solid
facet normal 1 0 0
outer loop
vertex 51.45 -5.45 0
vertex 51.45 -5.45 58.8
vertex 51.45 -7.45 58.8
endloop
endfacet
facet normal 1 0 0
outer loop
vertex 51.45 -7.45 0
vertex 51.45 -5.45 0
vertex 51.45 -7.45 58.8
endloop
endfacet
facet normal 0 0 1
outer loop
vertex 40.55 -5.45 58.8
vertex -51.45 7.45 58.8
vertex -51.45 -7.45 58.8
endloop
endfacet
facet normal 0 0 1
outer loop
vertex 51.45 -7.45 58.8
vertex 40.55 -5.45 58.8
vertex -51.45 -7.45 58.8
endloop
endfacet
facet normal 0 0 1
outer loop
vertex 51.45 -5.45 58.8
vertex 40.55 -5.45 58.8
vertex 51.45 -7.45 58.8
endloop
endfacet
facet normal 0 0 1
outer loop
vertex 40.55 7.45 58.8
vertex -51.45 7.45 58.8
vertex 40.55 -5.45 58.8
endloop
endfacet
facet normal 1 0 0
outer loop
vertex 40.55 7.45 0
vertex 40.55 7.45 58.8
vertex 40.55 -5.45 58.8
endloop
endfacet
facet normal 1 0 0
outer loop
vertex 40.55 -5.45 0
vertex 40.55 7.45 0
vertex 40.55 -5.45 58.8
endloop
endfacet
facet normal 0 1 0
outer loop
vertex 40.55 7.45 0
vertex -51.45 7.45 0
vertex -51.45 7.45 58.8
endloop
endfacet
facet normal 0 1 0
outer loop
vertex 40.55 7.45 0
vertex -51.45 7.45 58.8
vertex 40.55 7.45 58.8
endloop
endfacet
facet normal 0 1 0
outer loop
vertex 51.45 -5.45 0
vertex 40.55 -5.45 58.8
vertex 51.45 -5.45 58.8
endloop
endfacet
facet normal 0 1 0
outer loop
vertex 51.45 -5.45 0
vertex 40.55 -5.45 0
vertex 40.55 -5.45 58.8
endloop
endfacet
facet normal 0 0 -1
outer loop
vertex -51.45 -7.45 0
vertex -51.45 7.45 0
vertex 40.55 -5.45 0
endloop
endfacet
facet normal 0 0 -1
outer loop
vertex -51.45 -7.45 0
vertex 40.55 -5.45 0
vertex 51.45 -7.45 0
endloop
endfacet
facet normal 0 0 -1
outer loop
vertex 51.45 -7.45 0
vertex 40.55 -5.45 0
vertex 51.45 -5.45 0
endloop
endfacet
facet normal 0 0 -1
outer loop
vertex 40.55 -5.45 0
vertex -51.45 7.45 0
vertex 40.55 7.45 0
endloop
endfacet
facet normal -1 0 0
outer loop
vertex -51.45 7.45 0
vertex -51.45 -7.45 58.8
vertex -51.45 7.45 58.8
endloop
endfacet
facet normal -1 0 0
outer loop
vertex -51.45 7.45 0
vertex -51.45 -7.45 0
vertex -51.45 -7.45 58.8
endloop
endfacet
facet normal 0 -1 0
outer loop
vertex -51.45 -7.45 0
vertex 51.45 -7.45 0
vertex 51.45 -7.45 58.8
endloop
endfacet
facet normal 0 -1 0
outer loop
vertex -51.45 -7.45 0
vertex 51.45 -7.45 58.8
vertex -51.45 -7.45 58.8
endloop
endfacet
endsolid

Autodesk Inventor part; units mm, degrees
ref_plane "YZ Plane" through (0, 0, 0) normal (1, 0, 0) x (0, 1, 0)
ref_plane "XZ Plane" through (0, 0, 0) normal (0, 1, 0) x (-1, 0, 0)
ref_plane "XY Plane" through (0, 0, 0) normal (0, 0, 1) x (1, 0, 0)
sketch "Sketch1" plane through (0, 0, 0) normal (0, 0, 1) x (1, 0, 0)
  line L0 (-51.45, 7.45) -> (40.55, 7.45)
  line L1 (51.45, -5.45) -> (51.45, -7.45)
  line L2 (51.45, -7.45) -> (-51.45, -7.45)
  line L3 (-51.45, -7.45) -> (-51.45, 7.45)
  line L4 (-51.45, 7.45) -> (51.45, -7.45) construction
  line L5 (51.45, 7.45) -> (-51.45, -7.45) construction
  line L6 (40.55, 7.45) -> (40.55, -5.45)
  line L7 (40.55, -5.45) -> (51.45, -5.45)
  point P0 (0, 0)
  dimension "d0" = 102.9
  dimension "d1" = 14.9
  dimension "d2" = 12.9
  dimension "d3" = 10.9
extrude "Extrusion1" add sketch "Sketch1" along normal blind 58.8
sketch "Sketch2" plane through (40.55, -5.45, 0) normal (1, 0, 0) x (0, 0, -1)
  line L0 (0, 0) -> (-58.8, 0) projected
  line L1 (-58.8, 0) -> (-2, 0)
  line L2 (-2, 0) -> (-2, 2.25)
  line L3 (-2, 2.25) -> (-56.8, 2.25)
  line L4 (-58.8, 2.25) -> (-58.8, 0)
  line L5 (0, 12.9) -> (0, 0) projected
  line L6 (-56.8, 2.25) -> (-56.8, 0)
  line L7 (-56.8, 4.8) -> (-2, 4.8)
  line L8 (-2, 4.8) -> (-2, 2.55)
  line L9 (-2, 2.55) -> (-56.8, 2.55)
  line L10 (-58.8, 4.8) -> (-2, 2.55) construction
  line L11 (-2, 4.8) -> (-58.8, 2.55) construction
  line L12 (-56.8, 4.8) -> (-56.8, 2.6292)
  line L13 (-56.8, 5.1) -> (-2, 5.1)
  line L14 (-2, 5.1) -> (-2, 7.35)
  line L15 (-2, 7.35) -> (-56.8, 7.35)
  line L16 (-56.8, 7.35) -> (-56.8, 5.1)
  line L17 (-56.8, 5.1) -> (-2, 7.35) construction
  line L18 (-2, 5.1) -> (-56.8, 7.35) construction
  line L19 (-58.8, 0) -> (-58.8, 12.9) projected
  line L20 (-56.8, 10.9) -> (-2, 10.9)
  line L21 (-2, 10.9) -> (-2, 8.7469)
  line L22 (-2, 8.7469) -> (-56.8, 8.7469)
  line L23 (-56.8, 8.7469) -> (-56.8, 10.9)
  line L24 (-56.8, 10.9) -> (-2, 8.7469) construction
  line L25 (-2, 10.9) -> (-56.8, 8.7469) construction
  line L26 (0, 12.9) -> (-58.8, 12.9) projected
  point P0 (0, 5.45)
  point P1 (-30.4, 3.675)
  point P2 (-29.4, 6.225)
  point P3 (-29.4, 9.8235)
  dimension "d6" = 56.8
  dimension "d7" = 2.25
  dimension "d8" = 2
  dimension "d9" = 2.25
  dimension "d10" = 2
  dimension "d11" = 0.3
  dimension "d12" = 2.25
  dimension "d13" = 2
  dimension "d14" = 0.3
  dimension "d15" = 2.25
  dimension "d16" = 2
  dimension "d17" = 2
  dimension "d18" = 2
  dimension "d19" = 2
  dimension "d20" = 2.25
properties part number "cardBox_attempt1"
